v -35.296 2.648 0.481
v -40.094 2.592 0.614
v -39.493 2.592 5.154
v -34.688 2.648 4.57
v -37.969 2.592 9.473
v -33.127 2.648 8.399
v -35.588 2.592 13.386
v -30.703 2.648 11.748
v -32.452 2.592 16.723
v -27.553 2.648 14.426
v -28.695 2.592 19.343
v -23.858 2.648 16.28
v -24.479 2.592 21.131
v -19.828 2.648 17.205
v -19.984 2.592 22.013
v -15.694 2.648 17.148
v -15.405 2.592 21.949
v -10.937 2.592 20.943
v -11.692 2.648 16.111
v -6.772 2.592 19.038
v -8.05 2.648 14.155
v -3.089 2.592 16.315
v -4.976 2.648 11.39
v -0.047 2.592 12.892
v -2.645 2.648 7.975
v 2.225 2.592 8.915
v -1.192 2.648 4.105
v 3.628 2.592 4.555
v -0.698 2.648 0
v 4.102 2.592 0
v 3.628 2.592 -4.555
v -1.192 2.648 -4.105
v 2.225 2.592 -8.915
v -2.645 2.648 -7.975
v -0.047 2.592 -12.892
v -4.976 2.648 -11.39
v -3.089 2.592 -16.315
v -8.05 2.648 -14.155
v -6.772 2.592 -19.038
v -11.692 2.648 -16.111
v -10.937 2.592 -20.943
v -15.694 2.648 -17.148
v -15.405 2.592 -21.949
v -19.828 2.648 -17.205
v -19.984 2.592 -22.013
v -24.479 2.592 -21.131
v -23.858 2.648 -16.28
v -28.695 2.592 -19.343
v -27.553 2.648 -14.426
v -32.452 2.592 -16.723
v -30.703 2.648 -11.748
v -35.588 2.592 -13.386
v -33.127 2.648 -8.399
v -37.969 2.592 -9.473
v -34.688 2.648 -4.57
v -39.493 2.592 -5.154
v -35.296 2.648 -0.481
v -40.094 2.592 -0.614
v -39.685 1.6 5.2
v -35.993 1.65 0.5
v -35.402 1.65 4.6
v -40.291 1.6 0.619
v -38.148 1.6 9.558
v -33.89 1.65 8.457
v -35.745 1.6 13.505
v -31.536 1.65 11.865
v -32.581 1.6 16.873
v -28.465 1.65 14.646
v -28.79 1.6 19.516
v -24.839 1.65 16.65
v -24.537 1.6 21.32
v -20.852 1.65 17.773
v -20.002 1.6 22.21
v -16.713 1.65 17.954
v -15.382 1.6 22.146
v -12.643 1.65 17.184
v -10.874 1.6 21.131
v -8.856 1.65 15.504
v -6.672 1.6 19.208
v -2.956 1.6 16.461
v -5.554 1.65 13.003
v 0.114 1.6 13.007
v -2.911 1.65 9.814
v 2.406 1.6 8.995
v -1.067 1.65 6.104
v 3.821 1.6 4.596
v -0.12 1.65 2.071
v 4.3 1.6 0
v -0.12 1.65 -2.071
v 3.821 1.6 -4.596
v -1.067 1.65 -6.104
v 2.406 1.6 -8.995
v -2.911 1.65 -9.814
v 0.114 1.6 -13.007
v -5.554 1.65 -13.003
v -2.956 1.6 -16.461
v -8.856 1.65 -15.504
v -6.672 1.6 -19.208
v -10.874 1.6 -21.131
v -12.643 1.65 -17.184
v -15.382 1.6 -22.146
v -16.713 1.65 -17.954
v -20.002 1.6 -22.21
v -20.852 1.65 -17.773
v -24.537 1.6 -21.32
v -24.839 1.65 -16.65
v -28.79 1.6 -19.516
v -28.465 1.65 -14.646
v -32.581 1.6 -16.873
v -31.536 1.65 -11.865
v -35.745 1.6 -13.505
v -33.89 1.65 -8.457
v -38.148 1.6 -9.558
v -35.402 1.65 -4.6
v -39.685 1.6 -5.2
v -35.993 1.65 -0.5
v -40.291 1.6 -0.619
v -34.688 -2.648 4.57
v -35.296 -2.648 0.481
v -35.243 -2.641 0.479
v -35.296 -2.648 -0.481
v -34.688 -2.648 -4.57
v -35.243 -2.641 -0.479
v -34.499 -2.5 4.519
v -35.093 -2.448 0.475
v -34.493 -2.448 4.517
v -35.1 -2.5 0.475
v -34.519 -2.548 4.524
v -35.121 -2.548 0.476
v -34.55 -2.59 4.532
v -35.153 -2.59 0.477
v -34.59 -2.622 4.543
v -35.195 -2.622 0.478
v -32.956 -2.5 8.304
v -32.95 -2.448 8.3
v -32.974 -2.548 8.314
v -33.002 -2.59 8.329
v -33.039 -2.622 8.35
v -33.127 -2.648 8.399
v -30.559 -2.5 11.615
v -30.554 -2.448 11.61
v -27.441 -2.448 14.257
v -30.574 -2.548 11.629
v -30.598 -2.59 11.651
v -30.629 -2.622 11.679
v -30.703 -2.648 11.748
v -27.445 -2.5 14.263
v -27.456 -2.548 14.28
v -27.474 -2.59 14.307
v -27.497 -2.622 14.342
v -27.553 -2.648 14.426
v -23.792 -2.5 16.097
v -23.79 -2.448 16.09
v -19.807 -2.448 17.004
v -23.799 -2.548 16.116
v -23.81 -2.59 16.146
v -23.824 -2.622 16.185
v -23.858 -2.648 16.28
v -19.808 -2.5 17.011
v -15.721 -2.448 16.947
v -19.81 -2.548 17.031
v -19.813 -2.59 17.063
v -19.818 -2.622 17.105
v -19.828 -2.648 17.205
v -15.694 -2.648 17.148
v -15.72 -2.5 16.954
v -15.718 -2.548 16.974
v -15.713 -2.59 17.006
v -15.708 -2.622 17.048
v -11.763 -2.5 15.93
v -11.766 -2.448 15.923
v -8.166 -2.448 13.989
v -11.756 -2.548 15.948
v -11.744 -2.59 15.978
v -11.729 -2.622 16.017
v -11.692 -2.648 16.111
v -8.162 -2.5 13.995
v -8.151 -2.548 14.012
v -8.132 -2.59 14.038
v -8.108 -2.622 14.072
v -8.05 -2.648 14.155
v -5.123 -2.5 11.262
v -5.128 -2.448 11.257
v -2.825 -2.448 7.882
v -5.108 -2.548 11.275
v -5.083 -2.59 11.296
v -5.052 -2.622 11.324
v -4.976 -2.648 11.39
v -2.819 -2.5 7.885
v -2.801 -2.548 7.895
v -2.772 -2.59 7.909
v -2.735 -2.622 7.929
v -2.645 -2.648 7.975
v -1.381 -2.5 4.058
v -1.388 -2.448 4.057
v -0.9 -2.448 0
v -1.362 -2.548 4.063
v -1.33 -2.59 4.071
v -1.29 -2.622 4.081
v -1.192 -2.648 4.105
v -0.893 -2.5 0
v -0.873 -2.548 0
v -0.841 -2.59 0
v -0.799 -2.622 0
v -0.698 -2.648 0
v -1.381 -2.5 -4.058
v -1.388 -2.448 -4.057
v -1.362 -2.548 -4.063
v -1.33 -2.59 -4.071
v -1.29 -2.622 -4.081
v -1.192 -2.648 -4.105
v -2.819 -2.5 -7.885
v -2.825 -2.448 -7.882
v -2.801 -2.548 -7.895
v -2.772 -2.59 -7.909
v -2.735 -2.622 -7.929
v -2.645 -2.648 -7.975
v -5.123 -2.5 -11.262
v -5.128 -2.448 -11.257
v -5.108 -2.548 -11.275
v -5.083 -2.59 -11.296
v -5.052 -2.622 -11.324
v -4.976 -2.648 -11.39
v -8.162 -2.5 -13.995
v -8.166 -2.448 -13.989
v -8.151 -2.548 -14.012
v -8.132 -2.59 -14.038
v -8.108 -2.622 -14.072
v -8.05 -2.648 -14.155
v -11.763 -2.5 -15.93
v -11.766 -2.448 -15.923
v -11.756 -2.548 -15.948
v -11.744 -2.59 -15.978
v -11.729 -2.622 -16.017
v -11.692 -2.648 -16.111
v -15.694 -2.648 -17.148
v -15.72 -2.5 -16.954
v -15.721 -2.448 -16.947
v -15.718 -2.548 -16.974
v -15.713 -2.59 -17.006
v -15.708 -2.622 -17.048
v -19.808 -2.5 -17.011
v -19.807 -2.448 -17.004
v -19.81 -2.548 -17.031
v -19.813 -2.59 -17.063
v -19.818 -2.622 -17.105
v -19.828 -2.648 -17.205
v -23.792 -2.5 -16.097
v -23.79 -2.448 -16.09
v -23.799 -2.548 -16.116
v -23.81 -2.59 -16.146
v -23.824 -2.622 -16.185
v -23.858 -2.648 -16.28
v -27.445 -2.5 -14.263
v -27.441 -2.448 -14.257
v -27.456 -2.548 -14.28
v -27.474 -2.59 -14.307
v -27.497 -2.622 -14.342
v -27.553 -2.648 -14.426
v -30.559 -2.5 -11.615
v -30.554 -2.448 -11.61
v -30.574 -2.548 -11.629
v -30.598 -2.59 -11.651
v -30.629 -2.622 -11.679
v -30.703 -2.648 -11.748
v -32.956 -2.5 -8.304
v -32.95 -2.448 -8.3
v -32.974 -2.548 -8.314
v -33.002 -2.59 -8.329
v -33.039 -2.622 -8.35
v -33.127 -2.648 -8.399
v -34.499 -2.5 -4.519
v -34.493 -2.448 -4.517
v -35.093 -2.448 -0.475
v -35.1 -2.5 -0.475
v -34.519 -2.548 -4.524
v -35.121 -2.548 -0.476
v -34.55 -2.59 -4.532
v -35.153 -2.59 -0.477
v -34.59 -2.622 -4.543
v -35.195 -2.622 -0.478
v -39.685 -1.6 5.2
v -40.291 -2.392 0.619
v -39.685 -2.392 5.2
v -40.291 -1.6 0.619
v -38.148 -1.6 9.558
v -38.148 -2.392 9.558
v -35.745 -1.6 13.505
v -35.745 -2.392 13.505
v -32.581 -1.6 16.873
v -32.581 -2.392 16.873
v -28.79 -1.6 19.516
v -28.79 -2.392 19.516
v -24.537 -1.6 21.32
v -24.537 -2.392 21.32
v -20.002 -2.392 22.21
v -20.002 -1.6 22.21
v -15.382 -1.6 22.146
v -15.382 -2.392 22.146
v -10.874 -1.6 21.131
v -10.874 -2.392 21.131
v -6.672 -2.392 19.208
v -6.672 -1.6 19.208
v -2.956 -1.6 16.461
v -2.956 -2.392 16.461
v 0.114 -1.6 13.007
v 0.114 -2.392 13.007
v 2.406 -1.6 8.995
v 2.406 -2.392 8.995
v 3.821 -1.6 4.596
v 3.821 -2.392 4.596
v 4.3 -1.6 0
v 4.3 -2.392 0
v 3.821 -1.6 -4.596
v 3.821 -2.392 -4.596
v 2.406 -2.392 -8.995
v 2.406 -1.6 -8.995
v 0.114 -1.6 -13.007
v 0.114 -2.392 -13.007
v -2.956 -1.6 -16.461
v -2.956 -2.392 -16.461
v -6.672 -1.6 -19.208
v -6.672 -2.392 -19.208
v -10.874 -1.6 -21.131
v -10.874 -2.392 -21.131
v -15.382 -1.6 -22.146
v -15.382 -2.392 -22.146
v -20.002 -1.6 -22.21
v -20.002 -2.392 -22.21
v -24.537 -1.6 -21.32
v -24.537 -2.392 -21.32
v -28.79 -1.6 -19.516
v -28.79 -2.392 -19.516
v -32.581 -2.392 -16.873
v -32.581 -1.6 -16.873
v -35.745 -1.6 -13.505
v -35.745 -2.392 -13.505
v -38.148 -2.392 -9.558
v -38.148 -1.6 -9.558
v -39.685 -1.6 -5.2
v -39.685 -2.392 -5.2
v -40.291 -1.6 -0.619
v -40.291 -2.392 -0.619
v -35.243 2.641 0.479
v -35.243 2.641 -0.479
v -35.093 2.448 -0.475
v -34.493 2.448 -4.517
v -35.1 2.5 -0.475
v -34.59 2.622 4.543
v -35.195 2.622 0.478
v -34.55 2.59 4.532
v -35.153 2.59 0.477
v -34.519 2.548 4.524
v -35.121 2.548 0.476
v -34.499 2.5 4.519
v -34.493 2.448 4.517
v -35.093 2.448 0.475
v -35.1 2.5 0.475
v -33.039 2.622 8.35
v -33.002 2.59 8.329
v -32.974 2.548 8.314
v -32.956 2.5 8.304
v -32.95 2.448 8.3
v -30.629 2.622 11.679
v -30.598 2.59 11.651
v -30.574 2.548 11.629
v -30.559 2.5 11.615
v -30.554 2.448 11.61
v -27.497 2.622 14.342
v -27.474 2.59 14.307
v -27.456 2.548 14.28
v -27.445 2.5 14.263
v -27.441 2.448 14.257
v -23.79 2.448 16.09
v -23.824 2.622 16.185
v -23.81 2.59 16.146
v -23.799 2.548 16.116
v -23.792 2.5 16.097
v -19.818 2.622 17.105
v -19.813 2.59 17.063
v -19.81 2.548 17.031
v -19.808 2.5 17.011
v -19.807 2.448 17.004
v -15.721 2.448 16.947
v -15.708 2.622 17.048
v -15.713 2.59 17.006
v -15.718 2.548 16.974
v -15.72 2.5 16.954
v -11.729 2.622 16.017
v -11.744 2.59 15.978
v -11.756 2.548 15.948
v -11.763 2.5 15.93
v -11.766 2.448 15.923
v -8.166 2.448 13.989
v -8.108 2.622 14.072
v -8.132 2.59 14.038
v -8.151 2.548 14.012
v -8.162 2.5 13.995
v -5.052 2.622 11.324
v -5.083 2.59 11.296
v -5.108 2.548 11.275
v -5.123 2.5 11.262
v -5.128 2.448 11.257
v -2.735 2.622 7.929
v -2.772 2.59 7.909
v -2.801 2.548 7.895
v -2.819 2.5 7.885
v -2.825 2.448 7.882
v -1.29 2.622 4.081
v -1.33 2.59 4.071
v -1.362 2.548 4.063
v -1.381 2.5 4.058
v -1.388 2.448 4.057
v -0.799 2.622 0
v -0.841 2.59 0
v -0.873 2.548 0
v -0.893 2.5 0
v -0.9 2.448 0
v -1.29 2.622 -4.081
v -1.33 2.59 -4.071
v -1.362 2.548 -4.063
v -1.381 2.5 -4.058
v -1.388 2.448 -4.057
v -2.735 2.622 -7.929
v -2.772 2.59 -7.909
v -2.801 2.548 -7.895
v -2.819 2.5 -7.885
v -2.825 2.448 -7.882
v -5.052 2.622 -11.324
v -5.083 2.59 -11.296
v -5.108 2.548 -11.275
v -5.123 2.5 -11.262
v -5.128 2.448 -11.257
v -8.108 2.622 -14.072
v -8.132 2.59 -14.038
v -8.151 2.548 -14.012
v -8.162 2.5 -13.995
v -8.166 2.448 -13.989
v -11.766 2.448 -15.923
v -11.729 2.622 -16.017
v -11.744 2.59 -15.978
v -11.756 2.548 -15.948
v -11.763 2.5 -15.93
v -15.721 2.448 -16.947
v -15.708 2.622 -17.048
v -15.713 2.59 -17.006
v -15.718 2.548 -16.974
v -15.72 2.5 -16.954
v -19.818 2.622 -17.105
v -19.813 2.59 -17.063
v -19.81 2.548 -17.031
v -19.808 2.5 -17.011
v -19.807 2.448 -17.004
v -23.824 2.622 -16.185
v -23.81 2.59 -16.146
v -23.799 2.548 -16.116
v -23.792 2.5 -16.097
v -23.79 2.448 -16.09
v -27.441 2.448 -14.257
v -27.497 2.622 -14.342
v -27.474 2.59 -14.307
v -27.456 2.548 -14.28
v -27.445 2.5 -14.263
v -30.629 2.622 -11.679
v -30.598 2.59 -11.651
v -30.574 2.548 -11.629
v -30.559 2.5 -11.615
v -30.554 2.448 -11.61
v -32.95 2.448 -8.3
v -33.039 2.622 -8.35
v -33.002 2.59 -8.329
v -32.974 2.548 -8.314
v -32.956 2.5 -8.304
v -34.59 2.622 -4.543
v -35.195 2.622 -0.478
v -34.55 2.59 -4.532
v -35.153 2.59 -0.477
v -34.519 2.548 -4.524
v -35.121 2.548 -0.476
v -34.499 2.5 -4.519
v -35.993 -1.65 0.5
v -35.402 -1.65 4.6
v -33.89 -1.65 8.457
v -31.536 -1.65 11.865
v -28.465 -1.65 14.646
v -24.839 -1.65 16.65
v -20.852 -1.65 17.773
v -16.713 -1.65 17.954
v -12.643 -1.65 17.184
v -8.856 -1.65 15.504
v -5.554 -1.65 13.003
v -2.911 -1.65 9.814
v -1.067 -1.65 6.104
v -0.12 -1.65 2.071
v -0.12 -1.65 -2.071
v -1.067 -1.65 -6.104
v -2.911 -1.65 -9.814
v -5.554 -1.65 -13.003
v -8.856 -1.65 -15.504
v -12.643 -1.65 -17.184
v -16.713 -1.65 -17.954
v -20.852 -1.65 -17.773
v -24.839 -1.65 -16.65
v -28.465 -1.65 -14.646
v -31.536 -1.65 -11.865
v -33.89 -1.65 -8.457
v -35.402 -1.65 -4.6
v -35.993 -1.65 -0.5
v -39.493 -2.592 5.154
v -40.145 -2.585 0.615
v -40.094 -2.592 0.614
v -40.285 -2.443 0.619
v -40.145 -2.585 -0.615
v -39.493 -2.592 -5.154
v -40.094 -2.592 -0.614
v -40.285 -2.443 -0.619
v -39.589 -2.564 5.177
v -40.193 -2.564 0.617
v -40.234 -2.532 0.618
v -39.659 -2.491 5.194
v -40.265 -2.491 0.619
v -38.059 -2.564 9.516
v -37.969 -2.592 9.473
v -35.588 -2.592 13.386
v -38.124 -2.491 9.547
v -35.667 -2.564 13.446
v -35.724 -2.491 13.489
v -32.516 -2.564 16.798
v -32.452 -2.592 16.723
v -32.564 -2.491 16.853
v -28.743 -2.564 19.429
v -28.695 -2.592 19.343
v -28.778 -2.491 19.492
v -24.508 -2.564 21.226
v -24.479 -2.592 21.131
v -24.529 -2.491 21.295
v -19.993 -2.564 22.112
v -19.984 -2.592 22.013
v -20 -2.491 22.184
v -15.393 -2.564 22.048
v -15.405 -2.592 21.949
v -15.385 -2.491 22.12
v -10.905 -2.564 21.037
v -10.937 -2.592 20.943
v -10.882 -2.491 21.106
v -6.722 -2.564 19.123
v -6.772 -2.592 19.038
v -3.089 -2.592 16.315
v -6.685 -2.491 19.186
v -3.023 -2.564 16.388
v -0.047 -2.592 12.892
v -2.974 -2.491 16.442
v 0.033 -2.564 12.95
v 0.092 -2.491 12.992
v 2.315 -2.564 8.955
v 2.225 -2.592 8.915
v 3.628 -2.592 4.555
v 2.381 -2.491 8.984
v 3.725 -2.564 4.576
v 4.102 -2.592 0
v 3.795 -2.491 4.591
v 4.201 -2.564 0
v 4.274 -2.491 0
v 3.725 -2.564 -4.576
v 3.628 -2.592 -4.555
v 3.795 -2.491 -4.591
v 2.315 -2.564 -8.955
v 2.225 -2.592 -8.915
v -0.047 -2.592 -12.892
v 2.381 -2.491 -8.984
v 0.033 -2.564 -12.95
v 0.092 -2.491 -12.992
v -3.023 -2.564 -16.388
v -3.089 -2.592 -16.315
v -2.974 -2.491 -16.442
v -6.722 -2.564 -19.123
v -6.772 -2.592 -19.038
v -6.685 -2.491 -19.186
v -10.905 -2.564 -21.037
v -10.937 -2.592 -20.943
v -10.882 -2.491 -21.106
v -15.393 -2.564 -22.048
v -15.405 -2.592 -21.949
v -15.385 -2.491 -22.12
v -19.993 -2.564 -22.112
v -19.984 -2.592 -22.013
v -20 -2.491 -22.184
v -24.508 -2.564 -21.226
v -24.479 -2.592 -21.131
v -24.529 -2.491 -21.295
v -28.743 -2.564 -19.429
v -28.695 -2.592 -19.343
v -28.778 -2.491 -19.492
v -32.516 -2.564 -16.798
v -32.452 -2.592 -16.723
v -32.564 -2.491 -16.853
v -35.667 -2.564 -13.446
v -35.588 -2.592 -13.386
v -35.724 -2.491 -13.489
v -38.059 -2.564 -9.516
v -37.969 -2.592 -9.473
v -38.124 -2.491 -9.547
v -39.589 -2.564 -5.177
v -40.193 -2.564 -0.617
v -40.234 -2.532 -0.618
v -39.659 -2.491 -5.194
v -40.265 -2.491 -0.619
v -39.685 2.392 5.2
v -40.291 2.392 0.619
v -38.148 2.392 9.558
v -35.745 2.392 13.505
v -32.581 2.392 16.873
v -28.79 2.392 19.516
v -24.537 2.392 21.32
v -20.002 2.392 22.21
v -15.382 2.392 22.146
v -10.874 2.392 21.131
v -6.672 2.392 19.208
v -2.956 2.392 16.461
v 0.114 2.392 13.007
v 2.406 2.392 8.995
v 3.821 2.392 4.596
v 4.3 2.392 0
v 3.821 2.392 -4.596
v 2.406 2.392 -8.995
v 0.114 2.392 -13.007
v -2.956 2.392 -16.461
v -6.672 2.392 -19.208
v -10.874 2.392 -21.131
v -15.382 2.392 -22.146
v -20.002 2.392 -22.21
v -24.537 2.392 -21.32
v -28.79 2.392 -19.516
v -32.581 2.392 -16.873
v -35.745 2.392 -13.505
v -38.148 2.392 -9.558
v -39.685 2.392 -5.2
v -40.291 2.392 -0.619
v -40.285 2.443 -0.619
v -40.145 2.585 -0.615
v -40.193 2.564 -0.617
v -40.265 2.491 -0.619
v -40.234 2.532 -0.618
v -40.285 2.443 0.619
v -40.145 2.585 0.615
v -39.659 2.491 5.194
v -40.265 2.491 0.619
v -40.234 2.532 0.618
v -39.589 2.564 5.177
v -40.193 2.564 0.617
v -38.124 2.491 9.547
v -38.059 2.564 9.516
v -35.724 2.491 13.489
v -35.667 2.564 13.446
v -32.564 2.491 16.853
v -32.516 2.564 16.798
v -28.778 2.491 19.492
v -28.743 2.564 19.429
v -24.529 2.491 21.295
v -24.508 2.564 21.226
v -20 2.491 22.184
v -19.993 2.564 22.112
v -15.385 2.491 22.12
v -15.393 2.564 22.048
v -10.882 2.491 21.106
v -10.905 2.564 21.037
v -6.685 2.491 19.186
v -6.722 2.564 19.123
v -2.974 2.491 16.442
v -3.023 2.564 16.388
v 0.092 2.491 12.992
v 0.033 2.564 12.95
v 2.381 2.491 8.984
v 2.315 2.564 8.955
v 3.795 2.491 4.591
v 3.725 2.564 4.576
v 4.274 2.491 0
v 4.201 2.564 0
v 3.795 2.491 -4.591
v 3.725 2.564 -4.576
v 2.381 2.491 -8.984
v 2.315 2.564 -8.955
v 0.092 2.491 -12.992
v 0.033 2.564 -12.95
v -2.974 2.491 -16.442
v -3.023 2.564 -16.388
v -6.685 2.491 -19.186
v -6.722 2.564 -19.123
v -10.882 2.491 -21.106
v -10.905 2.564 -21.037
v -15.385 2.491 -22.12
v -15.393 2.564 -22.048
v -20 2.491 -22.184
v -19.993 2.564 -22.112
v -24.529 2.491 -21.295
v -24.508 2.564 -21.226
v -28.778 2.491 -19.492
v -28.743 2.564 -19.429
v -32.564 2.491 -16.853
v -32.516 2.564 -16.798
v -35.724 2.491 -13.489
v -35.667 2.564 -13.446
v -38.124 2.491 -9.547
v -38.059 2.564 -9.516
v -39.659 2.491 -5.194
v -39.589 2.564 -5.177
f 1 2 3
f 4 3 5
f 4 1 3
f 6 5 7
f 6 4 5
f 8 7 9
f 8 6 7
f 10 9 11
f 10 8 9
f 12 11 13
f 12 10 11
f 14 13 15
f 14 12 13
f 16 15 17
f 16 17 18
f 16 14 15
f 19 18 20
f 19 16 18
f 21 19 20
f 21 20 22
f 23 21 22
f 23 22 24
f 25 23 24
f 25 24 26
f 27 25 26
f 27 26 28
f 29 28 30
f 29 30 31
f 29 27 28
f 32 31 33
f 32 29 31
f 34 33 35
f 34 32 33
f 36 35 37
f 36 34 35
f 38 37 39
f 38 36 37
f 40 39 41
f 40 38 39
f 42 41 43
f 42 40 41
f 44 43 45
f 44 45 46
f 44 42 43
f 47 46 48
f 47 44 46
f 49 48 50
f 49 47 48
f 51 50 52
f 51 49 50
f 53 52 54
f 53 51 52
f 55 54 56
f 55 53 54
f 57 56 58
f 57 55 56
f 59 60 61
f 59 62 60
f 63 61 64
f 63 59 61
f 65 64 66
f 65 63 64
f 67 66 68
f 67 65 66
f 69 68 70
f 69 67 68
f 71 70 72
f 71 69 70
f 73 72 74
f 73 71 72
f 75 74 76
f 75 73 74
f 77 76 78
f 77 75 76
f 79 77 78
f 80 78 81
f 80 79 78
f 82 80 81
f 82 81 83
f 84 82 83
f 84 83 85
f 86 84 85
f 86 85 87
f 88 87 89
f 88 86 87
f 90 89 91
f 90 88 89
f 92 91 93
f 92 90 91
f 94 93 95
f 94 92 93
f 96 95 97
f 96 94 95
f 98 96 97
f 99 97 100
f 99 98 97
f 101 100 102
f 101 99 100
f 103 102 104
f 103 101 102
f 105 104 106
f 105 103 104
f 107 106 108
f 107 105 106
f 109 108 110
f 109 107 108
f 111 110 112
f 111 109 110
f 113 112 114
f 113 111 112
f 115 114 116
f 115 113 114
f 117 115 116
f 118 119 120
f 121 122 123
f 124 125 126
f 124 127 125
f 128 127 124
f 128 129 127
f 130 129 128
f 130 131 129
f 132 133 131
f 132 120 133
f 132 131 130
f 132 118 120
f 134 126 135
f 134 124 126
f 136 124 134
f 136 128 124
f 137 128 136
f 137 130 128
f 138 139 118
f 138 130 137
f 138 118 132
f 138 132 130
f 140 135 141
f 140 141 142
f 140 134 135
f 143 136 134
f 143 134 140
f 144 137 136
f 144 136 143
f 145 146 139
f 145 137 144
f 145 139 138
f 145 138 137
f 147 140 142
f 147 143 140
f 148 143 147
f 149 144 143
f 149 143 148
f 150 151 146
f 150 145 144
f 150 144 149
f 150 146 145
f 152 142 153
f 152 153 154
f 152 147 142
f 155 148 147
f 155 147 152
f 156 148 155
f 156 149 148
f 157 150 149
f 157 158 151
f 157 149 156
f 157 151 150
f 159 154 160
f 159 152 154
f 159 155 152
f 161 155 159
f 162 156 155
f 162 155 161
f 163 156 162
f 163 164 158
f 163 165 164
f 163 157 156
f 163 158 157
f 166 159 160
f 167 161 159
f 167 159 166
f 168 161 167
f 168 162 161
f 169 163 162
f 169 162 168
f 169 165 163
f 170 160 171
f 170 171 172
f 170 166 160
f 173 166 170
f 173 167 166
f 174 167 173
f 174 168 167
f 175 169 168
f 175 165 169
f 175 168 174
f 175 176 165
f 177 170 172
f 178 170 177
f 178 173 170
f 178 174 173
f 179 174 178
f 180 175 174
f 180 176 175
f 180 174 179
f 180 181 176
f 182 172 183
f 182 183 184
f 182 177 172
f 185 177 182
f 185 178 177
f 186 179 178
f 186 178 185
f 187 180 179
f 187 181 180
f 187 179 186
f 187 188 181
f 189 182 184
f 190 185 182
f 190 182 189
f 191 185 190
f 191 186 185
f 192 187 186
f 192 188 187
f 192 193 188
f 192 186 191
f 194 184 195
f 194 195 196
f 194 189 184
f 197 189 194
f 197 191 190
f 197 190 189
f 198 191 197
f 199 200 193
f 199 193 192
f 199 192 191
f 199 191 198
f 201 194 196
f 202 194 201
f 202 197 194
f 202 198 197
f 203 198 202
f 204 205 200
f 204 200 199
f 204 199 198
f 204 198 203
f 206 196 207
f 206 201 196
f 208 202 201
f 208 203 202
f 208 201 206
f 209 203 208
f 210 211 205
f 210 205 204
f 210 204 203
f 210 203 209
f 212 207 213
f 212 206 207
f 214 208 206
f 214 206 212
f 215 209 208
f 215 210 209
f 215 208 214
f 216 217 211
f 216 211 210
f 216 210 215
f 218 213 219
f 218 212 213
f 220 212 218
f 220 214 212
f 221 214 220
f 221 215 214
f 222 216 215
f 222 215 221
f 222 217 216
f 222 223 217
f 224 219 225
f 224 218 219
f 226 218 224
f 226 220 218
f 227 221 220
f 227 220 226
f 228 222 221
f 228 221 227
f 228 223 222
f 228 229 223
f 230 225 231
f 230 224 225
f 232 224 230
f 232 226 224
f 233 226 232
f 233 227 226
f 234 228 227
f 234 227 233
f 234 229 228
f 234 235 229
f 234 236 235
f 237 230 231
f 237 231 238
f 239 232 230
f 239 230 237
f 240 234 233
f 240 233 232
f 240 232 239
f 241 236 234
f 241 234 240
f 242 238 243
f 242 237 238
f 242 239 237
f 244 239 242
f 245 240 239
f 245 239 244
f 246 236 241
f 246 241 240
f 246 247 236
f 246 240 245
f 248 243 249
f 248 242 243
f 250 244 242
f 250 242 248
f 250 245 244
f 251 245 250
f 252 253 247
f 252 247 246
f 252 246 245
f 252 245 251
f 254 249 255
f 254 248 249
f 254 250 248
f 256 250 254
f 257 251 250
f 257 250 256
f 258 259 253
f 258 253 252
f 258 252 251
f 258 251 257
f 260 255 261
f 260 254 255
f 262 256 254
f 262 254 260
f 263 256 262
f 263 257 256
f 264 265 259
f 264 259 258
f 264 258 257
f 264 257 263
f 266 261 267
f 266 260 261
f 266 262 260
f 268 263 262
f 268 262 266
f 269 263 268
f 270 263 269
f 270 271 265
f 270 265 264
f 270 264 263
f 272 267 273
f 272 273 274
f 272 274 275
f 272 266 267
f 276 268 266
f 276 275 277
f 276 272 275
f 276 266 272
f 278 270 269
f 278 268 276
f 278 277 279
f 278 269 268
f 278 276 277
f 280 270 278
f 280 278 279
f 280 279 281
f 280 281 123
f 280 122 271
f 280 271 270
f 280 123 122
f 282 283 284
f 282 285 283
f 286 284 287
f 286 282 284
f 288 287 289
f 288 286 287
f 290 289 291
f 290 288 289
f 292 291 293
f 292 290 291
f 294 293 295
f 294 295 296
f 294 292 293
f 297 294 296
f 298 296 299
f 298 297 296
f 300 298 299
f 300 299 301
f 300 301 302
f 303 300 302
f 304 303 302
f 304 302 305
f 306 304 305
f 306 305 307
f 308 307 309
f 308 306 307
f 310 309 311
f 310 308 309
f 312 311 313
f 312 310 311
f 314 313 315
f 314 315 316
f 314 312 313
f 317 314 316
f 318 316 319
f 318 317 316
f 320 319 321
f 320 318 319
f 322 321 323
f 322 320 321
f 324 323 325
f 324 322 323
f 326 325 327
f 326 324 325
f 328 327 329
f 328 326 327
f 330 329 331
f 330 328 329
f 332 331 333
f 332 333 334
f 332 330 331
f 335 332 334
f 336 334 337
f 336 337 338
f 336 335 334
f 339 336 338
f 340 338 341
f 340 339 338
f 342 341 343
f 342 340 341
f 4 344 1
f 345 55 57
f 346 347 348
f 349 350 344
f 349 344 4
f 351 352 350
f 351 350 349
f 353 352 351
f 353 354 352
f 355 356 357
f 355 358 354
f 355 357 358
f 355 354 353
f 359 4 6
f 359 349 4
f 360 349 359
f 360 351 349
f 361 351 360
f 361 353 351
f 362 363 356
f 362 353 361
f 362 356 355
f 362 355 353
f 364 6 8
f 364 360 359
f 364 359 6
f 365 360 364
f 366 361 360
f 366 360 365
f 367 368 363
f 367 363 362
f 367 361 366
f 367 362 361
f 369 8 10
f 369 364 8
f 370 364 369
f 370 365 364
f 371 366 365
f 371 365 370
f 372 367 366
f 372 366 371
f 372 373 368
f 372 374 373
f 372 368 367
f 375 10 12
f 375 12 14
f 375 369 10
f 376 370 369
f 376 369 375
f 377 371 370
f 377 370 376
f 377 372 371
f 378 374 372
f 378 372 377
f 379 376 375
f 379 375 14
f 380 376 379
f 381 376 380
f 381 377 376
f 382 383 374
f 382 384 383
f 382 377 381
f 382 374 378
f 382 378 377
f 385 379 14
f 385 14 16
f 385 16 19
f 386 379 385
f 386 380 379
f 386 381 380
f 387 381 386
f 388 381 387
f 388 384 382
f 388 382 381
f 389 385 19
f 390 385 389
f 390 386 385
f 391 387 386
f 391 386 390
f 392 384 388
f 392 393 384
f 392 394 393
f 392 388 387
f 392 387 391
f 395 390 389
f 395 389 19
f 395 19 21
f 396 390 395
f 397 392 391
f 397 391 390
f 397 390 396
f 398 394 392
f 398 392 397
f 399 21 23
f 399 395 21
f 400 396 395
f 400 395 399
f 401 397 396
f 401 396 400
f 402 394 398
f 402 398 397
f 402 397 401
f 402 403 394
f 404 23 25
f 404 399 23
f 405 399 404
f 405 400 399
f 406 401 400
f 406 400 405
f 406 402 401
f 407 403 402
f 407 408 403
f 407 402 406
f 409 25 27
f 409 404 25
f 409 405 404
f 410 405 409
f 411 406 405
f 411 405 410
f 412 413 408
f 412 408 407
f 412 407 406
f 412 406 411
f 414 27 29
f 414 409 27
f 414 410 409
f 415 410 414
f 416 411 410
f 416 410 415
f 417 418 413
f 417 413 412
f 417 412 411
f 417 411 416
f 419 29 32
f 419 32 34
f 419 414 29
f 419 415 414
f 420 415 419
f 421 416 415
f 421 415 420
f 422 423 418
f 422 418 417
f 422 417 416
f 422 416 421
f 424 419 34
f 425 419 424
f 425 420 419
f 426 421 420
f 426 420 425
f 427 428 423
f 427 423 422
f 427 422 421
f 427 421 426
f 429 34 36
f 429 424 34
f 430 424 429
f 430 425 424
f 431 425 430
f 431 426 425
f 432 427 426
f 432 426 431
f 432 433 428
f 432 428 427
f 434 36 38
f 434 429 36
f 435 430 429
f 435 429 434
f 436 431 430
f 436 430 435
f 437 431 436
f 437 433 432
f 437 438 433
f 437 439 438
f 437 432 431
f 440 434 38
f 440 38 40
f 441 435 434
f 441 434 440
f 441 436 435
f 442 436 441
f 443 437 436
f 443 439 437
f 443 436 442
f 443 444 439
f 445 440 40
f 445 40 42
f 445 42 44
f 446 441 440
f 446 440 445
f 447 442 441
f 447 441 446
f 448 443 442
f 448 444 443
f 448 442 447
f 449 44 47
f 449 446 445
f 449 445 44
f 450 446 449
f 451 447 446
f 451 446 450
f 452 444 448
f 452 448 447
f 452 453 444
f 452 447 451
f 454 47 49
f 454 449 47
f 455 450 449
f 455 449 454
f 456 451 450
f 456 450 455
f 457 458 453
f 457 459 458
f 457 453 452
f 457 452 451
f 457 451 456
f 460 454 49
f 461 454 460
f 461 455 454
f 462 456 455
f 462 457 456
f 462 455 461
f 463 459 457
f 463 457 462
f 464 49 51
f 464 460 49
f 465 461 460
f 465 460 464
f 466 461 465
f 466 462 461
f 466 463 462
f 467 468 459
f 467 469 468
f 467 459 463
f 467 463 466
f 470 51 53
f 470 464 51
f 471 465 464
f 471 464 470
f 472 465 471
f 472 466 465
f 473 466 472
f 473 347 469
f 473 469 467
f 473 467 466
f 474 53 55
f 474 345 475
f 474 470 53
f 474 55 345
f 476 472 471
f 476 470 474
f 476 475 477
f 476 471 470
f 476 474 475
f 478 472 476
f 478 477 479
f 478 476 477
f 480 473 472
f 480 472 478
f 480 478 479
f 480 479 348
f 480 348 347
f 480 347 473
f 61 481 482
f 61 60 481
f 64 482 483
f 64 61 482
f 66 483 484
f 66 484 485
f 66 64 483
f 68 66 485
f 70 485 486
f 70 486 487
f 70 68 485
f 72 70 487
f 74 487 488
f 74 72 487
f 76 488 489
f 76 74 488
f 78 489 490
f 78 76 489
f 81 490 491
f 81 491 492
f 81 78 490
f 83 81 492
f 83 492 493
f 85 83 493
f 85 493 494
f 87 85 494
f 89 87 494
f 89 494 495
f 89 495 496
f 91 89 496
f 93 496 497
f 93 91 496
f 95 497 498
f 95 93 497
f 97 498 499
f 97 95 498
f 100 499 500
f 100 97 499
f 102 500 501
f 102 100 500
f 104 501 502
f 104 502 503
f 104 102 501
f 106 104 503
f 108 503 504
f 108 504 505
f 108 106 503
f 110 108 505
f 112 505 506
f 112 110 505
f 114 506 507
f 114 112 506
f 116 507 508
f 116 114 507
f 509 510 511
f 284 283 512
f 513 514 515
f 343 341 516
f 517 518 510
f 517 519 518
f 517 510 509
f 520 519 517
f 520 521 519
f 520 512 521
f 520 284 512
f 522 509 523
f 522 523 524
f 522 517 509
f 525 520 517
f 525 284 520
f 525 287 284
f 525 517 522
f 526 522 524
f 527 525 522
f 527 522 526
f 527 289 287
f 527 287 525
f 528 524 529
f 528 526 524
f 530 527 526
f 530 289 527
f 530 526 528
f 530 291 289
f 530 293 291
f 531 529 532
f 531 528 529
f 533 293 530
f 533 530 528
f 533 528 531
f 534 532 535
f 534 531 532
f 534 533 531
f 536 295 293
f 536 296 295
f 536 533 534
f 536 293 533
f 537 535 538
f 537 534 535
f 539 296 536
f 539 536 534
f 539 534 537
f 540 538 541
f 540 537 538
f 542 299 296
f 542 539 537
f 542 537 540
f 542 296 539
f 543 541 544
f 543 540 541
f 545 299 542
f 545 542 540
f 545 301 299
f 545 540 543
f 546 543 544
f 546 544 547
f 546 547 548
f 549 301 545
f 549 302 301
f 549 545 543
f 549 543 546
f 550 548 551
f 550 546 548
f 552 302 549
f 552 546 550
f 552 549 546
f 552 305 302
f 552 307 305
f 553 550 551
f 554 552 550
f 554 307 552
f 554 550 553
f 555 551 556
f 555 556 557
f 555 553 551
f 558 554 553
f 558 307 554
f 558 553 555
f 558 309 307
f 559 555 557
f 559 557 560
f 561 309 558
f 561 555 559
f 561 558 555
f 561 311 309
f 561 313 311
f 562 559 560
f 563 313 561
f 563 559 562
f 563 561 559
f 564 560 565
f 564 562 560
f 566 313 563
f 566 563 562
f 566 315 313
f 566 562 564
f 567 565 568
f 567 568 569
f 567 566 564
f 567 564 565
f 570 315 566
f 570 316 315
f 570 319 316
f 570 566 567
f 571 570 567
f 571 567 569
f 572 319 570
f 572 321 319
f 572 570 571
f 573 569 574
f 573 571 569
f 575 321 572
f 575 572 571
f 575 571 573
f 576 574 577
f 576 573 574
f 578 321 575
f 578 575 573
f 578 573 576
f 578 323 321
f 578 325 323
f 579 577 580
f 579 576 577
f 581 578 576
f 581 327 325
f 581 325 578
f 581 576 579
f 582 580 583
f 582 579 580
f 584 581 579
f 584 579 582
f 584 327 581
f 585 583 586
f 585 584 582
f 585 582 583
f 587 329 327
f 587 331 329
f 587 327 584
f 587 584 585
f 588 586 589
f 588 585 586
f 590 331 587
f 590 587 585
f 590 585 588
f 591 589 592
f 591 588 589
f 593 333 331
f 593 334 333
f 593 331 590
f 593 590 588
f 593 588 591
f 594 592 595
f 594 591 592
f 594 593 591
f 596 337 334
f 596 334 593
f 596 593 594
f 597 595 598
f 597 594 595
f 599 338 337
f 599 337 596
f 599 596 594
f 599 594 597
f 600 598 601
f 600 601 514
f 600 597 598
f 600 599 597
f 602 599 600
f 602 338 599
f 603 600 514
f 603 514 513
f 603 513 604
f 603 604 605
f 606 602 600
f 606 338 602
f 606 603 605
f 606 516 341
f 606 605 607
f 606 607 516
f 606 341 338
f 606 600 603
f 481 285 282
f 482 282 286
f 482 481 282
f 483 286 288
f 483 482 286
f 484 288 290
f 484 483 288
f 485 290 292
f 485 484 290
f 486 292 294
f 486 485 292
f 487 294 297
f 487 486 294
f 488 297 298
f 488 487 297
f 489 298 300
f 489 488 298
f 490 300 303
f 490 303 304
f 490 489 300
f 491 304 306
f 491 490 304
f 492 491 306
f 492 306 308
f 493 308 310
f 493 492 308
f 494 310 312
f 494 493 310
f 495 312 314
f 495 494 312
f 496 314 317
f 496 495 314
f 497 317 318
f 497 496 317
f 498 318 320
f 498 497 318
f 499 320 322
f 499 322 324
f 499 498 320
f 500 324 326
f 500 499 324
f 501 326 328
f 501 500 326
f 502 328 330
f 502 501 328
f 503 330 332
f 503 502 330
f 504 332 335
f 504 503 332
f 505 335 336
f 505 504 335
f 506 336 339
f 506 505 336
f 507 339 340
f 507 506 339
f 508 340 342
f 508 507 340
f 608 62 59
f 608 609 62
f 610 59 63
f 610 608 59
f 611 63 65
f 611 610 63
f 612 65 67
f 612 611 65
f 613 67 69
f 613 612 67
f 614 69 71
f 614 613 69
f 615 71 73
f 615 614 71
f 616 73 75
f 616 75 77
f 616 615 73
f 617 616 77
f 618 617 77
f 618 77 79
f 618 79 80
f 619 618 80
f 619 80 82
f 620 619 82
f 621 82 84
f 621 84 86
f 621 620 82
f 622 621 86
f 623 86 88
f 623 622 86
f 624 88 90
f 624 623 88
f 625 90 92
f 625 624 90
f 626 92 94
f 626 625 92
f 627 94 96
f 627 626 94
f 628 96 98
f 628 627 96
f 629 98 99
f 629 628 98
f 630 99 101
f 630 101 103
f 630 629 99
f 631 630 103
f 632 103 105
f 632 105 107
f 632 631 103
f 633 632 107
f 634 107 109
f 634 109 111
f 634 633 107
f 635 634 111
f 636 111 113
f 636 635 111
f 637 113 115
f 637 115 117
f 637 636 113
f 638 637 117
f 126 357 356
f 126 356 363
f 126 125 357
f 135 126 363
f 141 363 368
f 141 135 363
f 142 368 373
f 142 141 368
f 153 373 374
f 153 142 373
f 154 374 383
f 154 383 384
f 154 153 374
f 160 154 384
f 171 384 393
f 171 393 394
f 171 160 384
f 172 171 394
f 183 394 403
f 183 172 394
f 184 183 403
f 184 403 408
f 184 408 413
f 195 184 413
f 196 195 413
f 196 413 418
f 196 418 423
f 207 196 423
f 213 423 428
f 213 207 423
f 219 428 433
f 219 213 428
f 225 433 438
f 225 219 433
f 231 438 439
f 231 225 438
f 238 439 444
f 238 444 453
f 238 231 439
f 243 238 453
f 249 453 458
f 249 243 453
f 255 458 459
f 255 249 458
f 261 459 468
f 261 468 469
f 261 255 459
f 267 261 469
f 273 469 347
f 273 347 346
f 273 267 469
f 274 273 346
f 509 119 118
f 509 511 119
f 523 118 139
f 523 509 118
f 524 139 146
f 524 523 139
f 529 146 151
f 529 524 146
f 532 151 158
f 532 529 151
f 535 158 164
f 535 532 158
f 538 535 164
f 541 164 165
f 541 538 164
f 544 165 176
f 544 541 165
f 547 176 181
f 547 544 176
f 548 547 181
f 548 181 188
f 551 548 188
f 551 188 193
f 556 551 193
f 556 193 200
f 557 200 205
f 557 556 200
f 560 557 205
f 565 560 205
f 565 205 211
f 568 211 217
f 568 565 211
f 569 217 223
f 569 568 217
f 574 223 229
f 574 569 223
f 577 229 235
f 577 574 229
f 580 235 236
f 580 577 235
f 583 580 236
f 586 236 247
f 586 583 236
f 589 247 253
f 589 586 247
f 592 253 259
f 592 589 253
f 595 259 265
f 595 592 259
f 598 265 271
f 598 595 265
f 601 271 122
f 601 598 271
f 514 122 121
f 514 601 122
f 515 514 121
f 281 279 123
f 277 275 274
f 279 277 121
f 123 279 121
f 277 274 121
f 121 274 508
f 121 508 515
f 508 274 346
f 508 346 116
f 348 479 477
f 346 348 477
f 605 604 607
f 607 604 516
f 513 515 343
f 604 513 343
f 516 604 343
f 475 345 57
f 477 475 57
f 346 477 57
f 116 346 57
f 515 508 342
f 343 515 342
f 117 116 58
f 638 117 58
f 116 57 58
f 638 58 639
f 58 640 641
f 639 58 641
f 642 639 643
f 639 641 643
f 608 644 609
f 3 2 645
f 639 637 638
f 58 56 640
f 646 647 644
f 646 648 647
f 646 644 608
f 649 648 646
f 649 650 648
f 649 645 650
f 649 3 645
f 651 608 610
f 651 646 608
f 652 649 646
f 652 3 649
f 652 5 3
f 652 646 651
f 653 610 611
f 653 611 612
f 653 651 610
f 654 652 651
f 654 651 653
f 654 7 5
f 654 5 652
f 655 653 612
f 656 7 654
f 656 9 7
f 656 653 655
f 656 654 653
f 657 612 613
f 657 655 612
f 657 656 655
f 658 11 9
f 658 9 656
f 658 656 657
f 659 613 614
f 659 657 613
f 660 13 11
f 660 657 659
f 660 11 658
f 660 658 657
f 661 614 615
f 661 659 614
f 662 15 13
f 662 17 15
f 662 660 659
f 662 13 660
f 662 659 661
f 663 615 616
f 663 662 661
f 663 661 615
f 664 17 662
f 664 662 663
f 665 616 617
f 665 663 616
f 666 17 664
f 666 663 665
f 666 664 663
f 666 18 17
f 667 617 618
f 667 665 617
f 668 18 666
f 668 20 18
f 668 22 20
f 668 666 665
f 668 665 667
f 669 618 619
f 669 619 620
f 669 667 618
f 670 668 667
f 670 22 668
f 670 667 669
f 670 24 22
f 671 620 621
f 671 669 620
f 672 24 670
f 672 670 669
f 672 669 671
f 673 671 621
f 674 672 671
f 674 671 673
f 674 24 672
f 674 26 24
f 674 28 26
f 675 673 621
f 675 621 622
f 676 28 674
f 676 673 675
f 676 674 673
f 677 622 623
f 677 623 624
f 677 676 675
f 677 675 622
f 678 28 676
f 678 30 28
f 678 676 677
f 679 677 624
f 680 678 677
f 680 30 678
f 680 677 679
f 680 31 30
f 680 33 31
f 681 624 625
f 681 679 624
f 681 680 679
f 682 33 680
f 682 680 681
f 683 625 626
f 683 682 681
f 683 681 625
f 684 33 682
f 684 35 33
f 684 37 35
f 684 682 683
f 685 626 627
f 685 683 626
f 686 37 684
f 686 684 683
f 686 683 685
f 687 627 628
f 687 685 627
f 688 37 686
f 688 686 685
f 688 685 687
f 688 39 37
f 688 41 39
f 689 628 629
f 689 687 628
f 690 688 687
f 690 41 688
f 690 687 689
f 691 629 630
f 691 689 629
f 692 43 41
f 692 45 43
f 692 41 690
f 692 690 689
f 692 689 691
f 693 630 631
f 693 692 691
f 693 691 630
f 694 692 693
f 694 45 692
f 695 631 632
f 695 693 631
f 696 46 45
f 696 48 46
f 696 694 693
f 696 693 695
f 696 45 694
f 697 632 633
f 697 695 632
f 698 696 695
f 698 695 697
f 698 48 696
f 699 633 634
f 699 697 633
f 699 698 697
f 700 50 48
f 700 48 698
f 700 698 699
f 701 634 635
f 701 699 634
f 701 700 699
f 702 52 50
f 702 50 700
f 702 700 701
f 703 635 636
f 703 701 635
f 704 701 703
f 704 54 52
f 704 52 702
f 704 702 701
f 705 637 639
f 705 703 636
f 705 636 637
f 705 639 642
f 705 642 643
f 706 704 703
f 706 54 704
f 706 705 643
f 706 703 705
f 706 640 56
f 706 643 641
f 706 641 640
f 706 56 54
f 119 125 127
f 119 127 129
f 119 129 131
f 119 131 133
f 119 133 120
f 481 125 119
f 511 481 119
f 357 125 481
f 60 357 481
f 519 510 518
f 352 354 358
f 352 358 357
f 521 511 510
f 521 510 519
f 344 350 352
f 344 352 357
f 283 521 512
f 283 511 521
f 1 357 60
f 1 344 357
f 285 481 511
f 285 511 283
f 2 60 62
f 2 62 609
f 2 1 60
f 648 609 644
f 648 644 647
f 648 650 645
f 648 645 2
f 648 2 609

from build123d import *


with BuildPart() as part:
    # ｽｲｰﾌﾟ1: sweep along a path in ｽｹｯﾁ2
    with BuildLine(Plane(origin=(0, 0, 0), x_dir=(1, 0, 0), z_dir=(0, 1, 0))) as sweep_1_path:
        ThreePointArc((-35.993054215, -0.5), (0, 0), (-35.993054215, 0.5))
    # ｽｹｯﾁ1 → ｽｲｰﾌﾟ1 (sweep)
    with BuildSketch(Plane.XY):
        with BuildLine():
            Line((4.3, -1.6), (4.3, -2.391846945))
            ThreePointArc((4.3, -2.391846945), (4.242241142, -2.532443736), (4.102325424, -2.591833425))
            Line((4.102325424, -2.591833425), (-0.697674576, -2.647647379))
            ThreePointArc((-0.697674576, -2.647647379), (-0.840596791, -2.58990204), (-0.9, -2.447660898))
            Line((-0.9, -2.447660898), (-0.9, 2.447660898))
            ThreePointArc((-0.9, 2.447660898), (-0.840596791, 2.58990204), (-0.697674576, 2.647647379))
            Line((-0.697674576, 2.647647379), (4.102325424, 2.591833425))
            ThreePointArc((4.102325424, 2.591833425), (4.242241142, 2.532443736), (4.3, 2.391846945))
            Line((4.3, 2.391846945), (4.3, 1.6))
            Line((4.3, 1.6), (0, 1.65))
            Line((0, 1.65), (0, -1.65))
            Line((0, -1.65), (4.3, -1.6))
        make_face()
    sweep(path=sweep_1_path.line)


solid = part.part
